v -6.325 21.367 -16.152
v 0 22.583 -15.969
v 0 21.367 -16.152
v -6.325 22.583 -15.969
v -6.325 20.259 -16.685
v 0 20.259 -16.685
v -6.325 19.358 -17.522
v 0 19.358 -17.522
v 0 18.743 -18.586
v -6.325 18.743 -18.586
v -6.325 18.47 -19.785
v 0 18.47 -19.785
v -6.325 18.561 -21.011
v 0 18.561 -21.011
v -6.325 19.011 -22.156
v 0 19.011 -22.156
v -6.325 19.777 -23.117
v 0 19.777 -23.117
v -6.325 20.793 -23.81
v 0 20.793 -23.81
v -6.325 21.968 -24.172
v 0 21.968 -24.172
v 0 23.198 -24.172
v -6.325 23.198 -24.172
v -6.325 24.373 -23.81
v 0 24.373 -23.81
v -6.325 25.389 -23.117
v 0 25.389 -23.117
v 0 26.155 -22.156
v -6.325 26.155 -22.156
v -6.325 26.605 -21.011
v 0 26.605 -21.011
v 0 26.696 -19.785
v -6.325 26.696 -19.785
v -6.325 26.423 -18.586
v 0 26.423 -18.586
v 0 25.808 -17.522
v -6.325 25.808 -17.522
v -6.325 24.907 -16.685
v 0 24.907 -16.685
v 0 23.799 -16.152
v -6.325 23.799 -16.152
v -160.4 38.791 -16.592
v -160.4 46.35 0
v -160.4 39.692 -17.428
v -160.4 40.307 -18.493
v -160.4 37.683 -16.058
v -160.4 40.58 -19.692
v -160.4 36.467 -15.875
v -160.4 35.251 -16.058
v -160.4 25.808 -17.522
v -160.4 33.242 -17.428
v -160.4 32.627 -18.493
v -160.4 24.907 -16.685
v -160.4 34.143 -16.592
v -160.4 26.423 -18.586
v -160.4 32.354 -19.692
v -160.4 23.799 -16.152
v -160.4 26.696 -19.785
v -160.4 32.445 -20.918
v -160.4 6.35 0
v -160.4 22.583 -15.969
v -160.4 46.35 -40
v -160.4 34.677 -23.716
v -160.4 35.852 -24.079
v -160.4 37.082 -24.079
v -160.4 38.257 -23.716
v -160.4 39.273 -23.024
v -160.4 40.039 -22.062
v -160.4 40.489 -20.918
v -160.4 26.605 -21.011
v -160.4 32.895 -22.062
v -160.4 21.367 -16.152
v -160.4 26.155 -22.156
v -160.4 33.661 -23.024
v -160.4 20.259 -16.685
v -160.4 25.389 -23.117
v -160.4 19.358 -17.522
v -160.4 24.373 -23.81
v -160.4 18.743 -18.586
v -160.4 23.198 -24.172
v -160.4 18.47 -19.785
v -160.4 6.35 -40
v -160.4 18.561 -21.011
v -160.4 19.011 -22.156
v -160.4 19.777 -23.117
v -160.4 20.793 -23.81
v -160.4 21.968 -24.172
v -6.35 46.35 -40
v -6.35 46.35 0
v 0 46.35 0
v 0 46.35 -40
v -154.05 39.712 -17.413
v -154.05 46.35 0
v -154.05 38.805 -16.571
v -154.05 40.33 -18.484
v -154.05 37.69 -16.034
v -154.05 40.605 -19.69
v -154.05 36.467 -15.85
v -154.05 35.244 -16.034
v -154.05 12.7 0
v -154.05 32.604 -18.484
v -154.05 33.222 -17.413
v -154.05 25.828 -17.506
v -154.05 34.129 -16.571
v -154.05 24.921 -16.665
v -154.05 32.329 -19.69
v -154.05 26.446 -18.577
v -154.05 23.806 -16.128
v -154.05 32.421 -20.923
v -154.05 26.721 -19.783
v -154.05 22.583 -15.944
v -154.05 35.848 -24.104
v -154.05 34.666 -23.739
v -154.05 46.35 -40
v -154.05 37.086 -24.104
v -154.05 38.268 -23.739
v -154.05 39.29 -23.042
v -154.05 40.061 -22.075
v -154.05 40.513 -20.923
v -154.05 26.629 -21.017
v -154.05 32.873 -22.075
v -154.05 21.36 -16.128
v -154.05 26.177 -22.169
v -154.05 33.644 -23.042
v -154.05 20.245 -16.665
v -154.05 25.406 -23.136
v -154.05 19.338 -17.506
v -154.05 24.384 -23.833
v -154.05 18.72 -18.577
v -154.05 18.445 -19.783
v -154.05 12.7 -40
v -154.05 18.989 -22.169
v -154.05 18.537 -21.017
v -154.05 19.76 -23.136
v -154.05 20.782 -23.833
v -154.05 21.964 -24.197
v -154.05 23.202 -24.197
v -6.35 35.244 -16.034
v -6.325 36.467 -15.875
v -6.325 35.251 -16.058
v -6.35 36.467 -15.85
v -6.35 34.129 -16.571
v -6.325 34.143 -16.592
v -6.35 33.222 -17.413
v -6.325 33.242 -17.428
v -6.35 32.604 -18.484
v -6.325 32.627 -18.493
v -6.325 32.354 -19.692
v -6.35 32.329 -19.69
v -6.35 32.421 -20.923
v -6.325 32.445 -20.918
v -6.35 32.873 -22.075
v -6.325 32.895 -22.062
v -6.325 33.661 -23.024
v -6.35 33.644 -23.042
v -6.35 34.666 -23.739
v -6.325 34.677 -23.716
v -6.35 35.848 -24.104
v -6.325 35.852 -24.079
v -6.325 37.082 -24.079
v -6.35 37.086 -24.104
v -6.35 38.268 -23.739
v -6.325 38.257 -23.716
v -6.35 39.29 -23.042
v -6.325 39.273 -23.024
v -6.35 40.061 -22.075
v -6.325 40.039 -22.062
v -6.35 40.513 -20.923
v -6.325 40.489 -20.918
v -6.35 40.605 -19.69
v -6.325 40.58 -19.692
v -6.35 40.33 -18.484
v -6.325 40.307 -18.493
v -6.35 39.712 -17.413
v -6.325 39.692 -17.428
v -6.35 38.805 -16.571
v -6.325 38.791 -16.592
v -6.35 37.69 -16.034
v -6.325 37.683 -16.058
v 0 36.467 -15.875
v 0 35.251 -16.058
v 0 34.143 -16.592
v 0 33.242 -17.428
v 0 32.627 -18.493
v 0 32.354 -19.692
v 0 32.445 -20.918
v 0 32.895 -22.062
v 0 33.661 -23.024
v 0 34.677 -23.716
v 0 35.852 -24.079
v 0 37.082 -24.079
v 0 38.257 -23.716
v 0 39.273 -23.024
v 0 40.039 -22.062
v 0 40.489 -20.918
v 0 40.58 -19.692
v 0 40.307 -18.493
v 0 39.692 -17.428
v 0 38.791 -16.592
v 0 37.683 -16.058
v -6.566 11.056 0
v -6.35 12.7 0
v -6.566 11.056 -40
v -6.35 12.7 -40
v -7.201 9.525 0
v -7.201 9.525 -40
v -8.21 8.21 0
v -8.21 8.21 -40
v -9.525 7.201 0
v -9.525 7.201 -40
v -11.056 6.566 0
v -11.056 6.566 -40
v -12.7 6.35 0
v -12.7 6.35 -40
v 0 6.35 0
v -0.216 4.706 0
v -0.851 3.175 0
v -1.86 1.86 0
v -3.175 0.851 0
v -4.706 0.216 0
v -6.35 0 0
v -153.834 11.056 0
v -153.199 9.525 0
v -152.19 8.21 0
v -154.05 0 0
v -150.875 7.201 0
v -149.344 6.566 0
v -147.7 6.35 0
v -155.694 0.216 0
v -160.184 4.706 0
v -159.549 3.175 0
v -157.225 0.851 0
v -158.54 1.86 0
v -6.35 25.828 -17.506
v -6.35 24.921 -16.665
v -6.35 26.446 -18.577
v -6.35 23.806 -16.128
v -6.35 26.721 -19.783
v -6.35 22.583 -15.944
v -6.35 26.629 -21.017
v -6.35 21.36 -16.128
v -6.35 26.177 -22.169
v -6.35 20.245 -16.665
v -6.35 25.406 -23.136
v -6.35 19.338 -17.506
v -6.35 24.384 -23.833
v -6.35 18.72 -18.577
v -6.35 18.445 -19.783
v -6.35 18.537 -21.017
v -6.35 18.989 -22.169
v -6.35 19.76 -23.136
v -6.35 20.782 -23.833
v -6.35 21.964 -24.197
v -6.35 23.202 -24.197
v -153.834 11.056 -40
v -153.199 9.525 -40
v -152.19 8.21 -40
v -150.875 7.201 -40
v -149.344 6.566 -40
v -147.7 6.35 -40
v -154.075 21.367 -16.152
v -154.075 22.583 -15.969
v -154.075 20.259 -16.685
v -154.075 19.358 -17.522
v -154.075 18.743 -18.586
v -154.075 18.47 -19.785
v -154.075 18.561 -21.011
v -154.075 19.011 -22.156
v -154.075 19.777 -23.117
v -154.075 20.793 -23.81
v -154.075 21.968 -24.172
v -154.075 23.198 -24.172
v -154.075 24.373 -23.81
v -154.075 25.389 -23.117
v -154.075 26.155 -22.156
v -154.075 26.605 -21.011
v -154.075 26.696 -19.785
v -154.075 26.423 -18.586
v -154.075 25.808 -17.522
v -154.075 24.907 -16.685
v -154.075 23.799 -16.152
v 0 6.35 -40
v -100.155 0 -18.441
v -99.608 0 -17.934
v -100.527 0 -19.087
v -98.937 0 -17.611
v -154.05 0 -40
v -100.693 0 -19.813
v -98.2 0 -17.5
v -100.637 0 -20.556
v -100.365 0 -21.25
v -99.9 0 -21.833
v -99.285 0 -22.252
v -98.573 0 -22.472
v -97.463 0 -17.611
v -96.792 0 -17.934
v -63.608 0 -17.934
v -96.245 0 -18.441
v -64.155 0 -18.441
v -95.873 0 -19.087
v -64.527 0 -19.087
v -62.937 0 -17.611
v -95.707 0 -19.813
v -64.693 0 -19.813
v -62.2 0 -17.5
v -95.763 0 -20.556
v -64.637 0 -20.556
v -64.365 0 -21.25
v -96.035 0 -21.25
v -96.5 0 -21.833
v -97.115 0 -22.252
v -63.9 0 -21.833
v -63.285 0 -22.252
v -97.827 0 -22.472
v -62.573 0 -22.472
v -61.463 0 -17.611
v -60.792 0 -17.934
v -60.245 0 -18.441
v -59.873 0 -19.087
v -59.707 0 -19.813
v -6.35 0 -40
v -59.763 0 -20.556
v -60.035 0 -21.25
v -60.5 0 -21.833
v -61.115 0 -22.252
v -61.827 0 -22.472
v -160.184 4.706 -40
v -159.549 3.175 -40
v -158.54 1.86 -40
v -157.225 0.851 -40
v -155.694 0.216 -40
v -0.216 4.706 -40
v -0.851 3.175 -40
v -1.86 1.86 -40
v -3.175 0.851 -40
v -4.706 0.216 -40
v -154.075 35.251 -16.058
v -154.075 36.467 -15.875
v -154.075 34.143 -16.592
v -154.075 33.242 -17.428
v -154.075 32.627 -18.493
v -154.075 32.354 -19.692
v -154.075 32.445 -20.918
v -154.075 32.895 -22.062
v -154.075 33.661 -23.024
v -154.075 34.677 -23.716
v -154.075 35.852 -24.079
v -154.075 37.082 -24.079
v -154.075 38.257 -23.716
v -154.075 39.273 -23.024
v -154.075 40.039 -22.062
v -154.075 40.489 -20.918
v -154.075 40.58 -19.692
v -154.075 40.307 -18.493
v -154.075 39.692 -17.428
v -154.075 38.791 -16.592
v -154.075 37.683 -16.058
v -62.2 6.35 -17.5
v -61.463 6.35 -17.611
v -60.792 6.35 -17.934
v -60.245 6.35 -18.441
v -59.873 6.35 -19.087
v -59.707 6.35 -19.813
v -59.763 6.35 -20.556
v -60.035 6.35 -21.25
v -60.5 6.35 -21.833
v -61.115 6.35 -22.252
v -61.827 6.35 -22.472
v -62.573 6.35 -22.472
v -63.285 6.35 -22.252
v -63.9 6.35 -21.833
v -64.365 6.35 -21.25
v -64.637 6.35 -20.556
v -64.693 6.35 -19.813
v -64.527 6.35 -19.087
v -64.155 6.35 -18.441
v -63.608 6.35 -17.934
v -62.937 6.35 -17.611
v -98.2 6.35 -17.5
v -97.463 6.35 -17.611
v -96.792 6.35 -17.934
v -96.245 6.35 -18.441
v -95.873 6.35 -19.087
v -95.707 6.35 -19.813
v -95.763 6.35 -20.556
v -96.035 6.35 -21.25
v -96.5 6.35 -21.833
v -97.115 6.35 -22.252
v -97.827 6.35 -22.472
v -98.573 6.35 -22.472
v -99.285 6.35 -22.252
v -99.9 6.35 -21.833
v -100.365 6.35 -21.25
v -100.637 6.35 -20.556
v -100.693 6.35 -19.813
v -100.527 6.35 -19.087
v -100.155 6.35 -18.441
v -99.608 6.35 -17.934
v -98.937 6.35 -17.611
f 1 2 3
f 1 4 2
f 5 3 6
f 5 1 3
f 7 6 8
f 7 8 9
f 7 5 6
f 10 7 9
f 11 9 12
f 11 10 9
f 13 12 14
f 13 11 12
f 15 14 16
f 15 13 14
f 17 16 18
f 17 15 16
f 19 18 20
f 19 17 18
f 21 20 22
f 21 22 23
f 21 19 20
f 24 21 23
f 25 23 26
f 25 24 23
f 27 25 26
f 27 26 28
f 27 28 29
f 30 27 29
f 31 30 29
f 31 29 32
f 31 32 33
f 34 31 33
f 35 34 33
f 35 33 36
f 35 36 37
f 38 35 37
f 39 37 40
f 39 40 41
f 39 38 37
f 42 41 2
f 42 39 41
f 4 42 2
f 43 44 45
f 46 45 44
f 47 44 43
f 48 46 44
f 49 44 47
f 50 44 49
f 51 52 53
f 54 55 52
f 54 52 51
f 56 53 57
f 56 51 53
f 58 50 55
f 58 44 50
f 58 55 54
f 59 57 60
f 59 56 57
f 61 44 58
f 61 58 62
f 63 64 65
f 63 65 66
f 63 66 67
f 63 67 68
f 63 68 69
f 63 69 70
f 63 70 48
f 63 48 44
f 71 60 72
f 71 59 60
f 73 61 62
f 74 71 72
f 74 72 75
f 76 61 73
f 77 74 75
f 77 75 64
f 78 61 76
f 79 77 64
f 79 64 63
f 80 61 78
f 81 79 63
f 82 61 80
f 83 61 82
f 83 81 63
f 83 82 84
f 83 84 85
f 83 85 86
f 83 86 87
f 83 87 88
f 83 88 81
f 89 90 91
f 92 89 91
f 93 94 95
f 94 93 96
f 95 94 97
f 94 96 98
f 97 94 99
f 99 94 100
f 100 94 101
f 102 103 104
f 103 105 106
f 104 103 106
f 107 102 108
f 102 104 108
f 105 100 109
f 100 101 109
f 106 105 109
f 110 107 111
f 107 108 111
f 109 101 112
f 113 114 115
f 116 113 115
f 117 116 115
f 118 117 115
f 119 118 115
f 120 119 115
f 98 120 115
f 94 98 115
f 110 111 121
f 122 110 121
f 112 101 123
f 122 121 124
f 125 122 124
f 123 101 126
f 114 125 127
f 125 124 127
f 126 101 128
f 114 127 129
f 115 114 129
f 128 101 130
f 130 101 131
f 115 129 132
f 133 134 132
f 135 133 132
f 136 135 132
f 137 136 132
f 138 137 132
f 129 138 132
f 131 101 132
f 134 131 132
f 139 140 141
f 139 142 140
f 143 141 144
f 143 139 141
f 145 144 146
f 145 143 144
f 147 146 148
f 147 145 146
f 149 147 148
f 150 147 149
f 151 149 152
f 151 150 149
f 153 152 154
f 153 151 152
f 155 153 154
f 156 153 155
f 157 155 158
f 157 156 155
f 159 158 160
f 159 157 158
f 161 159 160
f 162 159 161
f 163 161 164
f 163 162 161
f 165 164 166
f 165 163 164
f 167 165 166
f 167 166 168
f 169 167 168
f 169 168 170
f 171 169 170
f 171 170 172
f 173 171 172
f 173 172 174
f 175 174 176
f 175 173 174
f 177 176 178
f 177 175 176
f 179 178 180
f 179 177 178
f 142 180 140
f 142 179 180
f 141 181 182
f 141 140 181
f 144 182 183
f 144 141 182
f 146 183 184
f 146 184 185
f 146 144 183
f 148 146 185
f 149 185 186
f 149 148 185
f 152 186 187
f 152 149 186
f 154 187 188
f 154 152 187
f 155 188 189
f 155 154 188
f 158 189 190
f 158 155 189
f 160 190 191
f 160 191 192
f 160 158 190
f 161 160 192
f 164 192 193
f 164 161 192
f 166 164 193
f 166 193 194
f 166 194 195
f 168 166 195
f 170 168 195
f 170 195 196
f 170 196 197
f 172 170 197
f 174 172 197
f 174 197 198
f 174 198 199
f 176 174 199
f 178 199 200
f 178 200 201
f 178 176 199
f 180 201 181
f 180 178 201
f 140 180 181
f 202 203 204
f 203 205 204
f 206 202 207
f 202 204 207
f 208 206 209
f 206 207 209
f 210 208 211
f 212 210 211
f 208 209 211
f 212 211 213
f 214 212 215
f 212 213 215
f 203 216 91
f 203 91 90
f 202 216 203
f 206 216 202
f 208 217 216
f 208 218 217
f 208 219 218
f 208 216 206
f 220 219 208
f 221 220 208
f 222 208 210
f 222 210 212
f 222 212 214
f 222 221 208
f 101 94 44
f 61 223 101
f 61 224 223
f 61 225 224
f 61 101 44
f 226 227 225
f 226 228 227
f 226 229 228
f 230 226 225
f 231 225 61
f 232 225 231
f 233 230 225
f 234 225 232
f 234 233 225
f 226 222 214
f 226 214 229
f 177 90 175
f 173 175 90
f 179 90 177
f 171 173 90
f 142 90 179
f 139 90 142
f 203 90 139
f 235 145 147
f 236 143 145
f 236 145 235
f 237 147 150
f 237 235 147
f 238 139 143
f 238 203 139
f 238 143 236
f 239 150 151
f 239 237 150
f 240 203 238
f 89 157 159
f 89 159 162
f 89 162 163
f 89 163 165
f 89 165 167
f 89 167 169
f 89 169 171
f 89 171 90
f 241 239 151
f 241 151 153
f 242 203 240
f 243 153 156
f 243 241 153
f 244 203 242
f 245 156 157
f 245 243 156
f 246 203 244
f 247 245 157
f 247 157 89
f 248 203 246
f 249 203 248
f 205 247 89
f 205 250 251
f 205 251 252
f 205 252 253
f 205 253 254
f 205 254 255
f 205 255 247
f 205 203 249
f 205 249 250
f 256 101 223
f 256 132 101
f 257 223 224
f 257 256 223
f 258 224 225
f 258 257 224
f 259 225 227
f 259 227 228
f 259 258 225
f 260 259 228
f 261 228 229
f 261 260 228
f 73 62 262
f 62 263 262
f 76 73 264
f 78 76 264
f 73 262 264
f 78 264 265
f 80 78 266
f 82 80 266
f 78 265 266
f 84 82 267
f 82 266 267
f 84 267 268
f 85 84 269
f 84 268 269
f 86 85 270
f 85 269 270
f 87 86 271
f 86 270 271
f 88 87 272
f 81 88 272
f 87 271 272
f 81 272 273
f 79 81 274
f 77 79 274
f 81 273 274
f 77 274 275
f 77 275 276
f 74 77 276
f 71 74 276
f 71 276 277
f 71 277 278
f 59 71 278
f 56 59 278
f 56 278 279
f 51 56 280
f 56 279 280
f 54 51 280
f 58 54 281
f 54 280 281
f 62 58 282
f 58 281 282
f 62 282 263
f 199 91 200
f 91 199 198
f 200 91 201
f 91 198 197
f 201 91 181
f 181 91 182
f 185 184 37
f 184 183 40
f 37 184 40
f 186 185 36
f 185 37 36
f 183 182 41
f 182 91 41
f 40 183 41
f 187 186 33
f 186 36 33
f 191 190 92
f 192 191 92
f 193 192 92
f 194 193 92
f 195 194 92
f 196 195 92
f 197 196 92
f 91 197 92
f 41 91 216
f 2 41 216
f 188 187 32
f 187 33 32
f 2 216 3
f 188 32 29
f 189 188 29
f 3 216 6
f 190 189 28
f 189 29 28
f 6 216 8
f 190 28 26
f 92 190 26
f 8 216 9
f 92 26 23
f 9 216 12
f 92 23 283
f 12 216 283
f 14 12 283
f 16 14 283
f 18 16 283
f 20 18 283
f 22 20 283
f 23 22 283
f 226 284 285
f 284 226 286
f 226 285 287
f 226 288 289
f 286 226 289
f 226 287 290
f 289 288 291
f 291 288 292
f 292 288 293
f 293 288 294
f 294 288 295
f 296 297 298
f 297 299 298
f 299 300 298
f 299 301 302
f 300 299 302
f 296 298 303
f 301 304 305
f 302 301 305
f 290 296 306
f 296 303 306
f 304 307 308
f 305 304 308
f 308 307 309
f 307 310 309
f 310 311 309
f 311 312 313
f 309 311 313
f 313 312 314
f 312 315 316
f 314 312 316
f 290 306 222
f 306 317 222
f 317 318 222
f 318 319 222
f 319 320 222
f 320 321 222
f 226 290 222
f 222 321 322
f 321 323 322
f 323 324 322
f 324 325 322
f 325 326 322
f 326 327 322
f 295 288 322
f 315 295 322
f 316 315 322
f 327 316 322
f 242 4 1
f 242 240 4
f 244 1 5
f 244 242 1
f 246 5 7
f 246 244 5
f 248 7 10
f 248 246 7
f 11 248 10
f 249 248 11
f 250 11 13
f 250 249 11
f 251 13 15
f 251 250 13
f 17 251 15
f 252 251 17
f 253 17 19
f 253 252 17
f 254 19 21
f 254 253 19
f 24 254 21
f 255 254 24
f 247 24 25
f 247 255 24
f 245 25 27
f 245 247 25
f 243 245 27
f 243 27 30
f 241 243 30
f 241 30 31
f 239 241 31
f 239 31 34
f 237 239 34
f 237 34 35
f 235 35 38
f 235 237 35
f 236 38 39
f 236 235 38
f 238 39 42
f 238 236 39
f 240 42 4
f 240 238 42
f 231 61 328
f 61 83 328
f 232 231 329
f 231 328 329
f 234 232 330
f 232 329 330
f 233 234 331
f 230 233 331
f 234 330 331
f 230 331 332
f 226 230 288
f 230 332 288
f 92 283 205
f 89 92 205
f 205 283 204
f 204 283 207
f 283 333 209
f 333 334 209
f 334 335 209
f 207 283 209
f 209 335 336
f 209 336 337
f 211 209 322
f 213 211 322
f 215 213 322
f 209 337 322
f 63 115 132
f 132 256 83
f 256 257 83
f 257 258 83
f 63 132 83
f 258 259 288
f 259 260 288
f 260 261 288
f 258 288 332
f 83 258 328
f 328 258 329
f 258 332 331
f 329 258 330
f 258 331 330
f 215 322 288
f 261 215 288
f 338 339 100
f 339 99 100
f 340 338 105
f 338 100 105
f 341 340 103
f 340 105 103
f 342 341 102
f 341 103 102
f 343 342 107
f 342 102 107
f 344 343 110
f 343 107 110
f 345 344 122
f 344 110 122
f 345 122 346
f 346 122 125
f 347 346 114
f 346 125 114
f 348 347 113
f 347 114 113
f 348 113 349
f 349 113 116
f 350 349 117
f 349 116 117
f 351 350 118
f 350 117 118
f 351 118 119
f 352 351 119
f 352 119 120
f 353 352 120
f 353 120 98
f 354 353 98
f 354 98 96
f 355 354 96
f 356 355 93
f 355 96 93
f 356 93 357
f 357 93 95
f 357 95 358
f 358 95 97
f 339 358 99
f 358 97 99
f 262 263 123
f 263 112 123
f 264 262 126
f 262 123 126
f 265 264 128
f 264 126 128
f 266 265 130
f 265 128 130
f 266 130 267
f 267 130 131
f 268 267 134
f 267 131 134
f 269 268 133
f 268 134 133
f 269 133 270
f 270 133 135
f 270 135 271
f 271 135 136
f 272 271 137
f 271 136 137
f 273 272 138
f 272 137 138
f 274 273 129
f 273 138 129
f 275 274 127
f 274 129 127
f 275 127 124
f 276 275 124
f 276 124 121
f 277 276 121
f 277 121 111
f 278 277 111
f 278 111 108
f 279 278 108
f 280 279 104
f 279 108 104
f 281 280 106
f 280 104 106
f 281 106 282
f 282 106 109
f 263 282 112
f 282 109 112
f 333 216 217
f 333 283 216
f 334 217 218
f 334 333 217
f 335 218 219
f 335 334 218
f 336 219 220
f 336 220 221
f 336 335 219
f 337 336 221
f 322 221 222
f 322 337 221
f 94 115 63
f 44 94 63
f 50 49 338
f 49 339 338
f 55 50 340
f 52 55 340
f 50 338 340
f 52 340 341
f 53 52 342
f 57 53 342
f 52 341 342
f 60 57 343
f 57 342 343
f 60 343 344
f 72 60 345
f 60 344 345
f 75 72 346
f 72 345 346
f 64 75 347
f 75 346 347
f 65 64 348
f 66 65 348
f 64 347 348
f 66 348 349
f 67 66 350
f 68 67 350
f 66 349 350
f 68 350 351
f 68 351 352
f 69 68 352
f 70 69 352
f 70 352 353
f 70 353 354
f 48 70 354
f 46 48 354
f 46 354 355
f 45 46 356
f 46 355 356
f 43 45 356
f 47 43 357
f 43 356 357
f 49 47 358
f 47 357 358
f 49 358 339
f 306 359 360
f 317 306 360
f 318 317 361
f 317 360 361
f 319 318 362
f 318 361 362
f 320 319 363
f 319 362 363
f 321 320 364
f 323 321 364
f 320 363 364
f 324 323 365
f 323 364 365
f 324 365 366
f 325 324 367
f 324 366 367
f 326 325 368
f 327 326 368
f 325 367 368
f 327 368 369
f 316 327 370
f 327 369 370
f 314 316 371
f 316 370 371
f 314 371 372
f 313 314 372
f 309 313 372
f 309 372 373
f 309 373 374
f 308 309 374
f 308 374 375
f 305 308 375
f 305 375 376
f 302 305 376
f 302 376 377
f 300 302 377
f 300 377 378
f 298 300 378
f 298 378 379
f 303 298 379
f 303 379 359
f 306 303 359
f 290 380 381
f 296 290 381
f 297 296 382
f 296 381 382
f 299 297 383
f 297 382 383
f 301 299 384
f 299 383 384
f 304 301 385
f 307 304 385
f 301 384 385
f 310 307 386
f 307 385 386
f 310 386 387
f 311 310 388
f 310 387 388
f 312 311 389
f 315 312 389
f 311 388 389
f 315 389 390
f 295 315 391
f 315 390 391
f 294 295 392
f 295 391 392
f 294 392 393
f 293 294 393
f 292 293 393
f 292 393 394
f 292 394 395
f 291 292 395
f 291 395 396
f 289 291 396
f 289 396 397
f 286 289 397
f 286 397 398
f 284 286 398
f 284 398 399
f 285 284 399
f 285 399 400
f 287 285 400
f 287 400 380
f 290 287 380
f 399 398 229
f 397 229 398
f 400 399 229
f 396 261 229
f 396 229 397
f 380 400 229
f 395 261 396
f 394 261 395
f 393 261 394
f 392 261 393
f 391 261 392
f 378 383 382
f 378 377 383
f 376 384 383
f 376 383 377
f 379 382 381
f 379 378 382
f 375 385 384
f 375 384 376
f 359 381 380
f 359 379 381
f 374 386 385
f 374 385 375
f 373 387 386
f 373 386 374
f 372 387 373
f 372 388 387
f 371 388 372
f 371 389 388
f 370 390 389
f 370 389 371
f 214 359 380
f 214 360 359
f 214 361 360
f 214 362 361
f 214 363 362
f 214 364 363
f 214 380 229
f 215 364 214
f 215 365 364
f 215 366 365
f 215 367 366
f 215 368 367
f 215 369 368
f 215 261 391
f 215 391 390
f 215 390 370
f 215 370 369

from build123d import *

# Parameters (mm, degrees)
SKETCH1_W                             = 154.05
SKETCH1_H                             = 40
BOSS_EXTRUDE1_DEPTH                   = 6.35
SKETCH2_W                             = 6.35
SKETCH2_H                             = 40
BOSS_EXTRUDE2_DEPTH                   = 40
FILLET1_R                             = 6.35
TAP_DRILL_FOR_M8_HELICOIL1_AT_2_COUNT = 2
TAP_DRILL_FOR_M8_HELICOIL1_AT_2_PITCH = 13.884315024
FILLET1_OF_MIRROR1_R                  = 6.35
SKETCH6_R                             = 2.5
CUT_EXTRUDE1_DEPTH                    = 40


with BuildPart() as part:
    # Sketch1 → Boss-Extrude1 (new body)
    with BuildSketch(Plane(origin=(0, 0, 0), x_dir=(1, 0, 0), z_dir=(0, 1, 0))):
        with Locations((-77.025, 20)):
            Rectangle(SKETCH1_W, SKETCH1_H)
    boss_extrude1 = extrude(amount=BOSS_EXTRUDE1_DEPTH)

    # Sketch2 → Boss-Extrude2 (add)
    with BuildSketch(Plane(origin=(0, 6.35, 0), x_dir=(1, 0, 0), z_dir=(0, 1, 0))):
        with Locations((-3.175, 20)):
            Rectangle(SKETCH2_W, SKETCH2_H)
    boss_extrude2 = extrude(amount=BOSS_EXTRUDE2_DEPTH)

    # Fillet1
    fillet1_edges = [part.edges().sort_by_distance(p)[0] for p in [
        (-6.35, 6.35, -20),
        (0, 0, -20),
    ]]
    fillet(fillet1_edges, radius=FILLET1_R)

    # Sketch5 → Tap Drill for M8 Helicoil1 (revolve, cut)
    with BuildSketch(Plane(origin=(-6.35, 36.467, -20), x_dir=(0, 0, 1), z_dir=(0, 1, 0))):
        Polygon((0, 0), (0, 6.35), (4.125, 6.35), (4.125, 0.025), (4.15, 0), align=None)
    tap_drill_for_m8_helicoil1 = revolve(axis=Axis((-12.7, 36.467, -20), (1, 0, 0)), mode=Mode.SUBTRACT)

    # Tap Drill for M8 Helicoil1 at 2: Tap Drill for M8 Helicoil1 ×2
    with Locations(*[Vector(0, -0.9999773107839142, -0.006736313336781501) * (i * TAP_DRILL_FOR_M8_HELICOIL1_AT_2_PITCH) for i in range(1, TAP_DRILL_FOR_M8_HELICOIL1_AT_2_COUNT)]):
        add(tap_drill_for_m8_helicoil1, mode=Mode.SUBTRACT)

    # Mirror1: Boss-Extrude1, Boss-Extrude2, Tap Drill for M8 Helicoil1 across plane
    add(boss_extrude1.mirror(Plane.ZY.offset(80.2)))
    add(boss_extrude2.mirror(Plane.ZY.offset(80.2)))
    add(tap_drill_for_m8_helicoil1.mirror(Plane.ZY.offset(80.2)), mode=Mode.SUBTRACT)

    # Mirror1 copy 1 sketch → Mirror1 copy 1 (revolve, cut)
    with BuildSketch(Plane(origin=(-154.05, 22.583, -20.093529096), x_dir=(0, 0, 1), z_dir=(0, 1, 0))):
        Polygon((0, 0), (0, -6.35), (4.125, -6.35), (4.125, -0.025), (4.15, 0), align=None)
    revolve(axis=Axis((-147.7, 22.583, -20.093529096), (1, 0, 0)), mode=Mode.SUBTRACT)

    # Fillet1 of Mirror1
    fillet1_of_mirror1_edges = [part.edges().sort_by_distance(p)[0] for p in [
        (-154.05, 6.35, -20),
        (-160.4, 0, -20),
    ]]
    fillet(fillet1_of_mirror1_edges, radius=FILLET1_OF_MIRROR1_R)

    # Sketch6 → Cut-Extrude1 (cut)
    with BuildSketch(Plane(origin=(0, 6.35, 0), x_dir=(1, 0, 0), z_dir=(0, 1, 0))):
        with Locations(Location((-98.2, 20, 0), (0, 0, 270))):
            Circle(SKETCH6_R)
        with Locations(Location((-62.2, 20, 0), (0, 0, 270))):
            Circle(SKETCH6_R)
    extrude(amount=-CUT_EXTRUDE1_DEPTH, mode=Mode.SUBTRACT)


solid = part.part
